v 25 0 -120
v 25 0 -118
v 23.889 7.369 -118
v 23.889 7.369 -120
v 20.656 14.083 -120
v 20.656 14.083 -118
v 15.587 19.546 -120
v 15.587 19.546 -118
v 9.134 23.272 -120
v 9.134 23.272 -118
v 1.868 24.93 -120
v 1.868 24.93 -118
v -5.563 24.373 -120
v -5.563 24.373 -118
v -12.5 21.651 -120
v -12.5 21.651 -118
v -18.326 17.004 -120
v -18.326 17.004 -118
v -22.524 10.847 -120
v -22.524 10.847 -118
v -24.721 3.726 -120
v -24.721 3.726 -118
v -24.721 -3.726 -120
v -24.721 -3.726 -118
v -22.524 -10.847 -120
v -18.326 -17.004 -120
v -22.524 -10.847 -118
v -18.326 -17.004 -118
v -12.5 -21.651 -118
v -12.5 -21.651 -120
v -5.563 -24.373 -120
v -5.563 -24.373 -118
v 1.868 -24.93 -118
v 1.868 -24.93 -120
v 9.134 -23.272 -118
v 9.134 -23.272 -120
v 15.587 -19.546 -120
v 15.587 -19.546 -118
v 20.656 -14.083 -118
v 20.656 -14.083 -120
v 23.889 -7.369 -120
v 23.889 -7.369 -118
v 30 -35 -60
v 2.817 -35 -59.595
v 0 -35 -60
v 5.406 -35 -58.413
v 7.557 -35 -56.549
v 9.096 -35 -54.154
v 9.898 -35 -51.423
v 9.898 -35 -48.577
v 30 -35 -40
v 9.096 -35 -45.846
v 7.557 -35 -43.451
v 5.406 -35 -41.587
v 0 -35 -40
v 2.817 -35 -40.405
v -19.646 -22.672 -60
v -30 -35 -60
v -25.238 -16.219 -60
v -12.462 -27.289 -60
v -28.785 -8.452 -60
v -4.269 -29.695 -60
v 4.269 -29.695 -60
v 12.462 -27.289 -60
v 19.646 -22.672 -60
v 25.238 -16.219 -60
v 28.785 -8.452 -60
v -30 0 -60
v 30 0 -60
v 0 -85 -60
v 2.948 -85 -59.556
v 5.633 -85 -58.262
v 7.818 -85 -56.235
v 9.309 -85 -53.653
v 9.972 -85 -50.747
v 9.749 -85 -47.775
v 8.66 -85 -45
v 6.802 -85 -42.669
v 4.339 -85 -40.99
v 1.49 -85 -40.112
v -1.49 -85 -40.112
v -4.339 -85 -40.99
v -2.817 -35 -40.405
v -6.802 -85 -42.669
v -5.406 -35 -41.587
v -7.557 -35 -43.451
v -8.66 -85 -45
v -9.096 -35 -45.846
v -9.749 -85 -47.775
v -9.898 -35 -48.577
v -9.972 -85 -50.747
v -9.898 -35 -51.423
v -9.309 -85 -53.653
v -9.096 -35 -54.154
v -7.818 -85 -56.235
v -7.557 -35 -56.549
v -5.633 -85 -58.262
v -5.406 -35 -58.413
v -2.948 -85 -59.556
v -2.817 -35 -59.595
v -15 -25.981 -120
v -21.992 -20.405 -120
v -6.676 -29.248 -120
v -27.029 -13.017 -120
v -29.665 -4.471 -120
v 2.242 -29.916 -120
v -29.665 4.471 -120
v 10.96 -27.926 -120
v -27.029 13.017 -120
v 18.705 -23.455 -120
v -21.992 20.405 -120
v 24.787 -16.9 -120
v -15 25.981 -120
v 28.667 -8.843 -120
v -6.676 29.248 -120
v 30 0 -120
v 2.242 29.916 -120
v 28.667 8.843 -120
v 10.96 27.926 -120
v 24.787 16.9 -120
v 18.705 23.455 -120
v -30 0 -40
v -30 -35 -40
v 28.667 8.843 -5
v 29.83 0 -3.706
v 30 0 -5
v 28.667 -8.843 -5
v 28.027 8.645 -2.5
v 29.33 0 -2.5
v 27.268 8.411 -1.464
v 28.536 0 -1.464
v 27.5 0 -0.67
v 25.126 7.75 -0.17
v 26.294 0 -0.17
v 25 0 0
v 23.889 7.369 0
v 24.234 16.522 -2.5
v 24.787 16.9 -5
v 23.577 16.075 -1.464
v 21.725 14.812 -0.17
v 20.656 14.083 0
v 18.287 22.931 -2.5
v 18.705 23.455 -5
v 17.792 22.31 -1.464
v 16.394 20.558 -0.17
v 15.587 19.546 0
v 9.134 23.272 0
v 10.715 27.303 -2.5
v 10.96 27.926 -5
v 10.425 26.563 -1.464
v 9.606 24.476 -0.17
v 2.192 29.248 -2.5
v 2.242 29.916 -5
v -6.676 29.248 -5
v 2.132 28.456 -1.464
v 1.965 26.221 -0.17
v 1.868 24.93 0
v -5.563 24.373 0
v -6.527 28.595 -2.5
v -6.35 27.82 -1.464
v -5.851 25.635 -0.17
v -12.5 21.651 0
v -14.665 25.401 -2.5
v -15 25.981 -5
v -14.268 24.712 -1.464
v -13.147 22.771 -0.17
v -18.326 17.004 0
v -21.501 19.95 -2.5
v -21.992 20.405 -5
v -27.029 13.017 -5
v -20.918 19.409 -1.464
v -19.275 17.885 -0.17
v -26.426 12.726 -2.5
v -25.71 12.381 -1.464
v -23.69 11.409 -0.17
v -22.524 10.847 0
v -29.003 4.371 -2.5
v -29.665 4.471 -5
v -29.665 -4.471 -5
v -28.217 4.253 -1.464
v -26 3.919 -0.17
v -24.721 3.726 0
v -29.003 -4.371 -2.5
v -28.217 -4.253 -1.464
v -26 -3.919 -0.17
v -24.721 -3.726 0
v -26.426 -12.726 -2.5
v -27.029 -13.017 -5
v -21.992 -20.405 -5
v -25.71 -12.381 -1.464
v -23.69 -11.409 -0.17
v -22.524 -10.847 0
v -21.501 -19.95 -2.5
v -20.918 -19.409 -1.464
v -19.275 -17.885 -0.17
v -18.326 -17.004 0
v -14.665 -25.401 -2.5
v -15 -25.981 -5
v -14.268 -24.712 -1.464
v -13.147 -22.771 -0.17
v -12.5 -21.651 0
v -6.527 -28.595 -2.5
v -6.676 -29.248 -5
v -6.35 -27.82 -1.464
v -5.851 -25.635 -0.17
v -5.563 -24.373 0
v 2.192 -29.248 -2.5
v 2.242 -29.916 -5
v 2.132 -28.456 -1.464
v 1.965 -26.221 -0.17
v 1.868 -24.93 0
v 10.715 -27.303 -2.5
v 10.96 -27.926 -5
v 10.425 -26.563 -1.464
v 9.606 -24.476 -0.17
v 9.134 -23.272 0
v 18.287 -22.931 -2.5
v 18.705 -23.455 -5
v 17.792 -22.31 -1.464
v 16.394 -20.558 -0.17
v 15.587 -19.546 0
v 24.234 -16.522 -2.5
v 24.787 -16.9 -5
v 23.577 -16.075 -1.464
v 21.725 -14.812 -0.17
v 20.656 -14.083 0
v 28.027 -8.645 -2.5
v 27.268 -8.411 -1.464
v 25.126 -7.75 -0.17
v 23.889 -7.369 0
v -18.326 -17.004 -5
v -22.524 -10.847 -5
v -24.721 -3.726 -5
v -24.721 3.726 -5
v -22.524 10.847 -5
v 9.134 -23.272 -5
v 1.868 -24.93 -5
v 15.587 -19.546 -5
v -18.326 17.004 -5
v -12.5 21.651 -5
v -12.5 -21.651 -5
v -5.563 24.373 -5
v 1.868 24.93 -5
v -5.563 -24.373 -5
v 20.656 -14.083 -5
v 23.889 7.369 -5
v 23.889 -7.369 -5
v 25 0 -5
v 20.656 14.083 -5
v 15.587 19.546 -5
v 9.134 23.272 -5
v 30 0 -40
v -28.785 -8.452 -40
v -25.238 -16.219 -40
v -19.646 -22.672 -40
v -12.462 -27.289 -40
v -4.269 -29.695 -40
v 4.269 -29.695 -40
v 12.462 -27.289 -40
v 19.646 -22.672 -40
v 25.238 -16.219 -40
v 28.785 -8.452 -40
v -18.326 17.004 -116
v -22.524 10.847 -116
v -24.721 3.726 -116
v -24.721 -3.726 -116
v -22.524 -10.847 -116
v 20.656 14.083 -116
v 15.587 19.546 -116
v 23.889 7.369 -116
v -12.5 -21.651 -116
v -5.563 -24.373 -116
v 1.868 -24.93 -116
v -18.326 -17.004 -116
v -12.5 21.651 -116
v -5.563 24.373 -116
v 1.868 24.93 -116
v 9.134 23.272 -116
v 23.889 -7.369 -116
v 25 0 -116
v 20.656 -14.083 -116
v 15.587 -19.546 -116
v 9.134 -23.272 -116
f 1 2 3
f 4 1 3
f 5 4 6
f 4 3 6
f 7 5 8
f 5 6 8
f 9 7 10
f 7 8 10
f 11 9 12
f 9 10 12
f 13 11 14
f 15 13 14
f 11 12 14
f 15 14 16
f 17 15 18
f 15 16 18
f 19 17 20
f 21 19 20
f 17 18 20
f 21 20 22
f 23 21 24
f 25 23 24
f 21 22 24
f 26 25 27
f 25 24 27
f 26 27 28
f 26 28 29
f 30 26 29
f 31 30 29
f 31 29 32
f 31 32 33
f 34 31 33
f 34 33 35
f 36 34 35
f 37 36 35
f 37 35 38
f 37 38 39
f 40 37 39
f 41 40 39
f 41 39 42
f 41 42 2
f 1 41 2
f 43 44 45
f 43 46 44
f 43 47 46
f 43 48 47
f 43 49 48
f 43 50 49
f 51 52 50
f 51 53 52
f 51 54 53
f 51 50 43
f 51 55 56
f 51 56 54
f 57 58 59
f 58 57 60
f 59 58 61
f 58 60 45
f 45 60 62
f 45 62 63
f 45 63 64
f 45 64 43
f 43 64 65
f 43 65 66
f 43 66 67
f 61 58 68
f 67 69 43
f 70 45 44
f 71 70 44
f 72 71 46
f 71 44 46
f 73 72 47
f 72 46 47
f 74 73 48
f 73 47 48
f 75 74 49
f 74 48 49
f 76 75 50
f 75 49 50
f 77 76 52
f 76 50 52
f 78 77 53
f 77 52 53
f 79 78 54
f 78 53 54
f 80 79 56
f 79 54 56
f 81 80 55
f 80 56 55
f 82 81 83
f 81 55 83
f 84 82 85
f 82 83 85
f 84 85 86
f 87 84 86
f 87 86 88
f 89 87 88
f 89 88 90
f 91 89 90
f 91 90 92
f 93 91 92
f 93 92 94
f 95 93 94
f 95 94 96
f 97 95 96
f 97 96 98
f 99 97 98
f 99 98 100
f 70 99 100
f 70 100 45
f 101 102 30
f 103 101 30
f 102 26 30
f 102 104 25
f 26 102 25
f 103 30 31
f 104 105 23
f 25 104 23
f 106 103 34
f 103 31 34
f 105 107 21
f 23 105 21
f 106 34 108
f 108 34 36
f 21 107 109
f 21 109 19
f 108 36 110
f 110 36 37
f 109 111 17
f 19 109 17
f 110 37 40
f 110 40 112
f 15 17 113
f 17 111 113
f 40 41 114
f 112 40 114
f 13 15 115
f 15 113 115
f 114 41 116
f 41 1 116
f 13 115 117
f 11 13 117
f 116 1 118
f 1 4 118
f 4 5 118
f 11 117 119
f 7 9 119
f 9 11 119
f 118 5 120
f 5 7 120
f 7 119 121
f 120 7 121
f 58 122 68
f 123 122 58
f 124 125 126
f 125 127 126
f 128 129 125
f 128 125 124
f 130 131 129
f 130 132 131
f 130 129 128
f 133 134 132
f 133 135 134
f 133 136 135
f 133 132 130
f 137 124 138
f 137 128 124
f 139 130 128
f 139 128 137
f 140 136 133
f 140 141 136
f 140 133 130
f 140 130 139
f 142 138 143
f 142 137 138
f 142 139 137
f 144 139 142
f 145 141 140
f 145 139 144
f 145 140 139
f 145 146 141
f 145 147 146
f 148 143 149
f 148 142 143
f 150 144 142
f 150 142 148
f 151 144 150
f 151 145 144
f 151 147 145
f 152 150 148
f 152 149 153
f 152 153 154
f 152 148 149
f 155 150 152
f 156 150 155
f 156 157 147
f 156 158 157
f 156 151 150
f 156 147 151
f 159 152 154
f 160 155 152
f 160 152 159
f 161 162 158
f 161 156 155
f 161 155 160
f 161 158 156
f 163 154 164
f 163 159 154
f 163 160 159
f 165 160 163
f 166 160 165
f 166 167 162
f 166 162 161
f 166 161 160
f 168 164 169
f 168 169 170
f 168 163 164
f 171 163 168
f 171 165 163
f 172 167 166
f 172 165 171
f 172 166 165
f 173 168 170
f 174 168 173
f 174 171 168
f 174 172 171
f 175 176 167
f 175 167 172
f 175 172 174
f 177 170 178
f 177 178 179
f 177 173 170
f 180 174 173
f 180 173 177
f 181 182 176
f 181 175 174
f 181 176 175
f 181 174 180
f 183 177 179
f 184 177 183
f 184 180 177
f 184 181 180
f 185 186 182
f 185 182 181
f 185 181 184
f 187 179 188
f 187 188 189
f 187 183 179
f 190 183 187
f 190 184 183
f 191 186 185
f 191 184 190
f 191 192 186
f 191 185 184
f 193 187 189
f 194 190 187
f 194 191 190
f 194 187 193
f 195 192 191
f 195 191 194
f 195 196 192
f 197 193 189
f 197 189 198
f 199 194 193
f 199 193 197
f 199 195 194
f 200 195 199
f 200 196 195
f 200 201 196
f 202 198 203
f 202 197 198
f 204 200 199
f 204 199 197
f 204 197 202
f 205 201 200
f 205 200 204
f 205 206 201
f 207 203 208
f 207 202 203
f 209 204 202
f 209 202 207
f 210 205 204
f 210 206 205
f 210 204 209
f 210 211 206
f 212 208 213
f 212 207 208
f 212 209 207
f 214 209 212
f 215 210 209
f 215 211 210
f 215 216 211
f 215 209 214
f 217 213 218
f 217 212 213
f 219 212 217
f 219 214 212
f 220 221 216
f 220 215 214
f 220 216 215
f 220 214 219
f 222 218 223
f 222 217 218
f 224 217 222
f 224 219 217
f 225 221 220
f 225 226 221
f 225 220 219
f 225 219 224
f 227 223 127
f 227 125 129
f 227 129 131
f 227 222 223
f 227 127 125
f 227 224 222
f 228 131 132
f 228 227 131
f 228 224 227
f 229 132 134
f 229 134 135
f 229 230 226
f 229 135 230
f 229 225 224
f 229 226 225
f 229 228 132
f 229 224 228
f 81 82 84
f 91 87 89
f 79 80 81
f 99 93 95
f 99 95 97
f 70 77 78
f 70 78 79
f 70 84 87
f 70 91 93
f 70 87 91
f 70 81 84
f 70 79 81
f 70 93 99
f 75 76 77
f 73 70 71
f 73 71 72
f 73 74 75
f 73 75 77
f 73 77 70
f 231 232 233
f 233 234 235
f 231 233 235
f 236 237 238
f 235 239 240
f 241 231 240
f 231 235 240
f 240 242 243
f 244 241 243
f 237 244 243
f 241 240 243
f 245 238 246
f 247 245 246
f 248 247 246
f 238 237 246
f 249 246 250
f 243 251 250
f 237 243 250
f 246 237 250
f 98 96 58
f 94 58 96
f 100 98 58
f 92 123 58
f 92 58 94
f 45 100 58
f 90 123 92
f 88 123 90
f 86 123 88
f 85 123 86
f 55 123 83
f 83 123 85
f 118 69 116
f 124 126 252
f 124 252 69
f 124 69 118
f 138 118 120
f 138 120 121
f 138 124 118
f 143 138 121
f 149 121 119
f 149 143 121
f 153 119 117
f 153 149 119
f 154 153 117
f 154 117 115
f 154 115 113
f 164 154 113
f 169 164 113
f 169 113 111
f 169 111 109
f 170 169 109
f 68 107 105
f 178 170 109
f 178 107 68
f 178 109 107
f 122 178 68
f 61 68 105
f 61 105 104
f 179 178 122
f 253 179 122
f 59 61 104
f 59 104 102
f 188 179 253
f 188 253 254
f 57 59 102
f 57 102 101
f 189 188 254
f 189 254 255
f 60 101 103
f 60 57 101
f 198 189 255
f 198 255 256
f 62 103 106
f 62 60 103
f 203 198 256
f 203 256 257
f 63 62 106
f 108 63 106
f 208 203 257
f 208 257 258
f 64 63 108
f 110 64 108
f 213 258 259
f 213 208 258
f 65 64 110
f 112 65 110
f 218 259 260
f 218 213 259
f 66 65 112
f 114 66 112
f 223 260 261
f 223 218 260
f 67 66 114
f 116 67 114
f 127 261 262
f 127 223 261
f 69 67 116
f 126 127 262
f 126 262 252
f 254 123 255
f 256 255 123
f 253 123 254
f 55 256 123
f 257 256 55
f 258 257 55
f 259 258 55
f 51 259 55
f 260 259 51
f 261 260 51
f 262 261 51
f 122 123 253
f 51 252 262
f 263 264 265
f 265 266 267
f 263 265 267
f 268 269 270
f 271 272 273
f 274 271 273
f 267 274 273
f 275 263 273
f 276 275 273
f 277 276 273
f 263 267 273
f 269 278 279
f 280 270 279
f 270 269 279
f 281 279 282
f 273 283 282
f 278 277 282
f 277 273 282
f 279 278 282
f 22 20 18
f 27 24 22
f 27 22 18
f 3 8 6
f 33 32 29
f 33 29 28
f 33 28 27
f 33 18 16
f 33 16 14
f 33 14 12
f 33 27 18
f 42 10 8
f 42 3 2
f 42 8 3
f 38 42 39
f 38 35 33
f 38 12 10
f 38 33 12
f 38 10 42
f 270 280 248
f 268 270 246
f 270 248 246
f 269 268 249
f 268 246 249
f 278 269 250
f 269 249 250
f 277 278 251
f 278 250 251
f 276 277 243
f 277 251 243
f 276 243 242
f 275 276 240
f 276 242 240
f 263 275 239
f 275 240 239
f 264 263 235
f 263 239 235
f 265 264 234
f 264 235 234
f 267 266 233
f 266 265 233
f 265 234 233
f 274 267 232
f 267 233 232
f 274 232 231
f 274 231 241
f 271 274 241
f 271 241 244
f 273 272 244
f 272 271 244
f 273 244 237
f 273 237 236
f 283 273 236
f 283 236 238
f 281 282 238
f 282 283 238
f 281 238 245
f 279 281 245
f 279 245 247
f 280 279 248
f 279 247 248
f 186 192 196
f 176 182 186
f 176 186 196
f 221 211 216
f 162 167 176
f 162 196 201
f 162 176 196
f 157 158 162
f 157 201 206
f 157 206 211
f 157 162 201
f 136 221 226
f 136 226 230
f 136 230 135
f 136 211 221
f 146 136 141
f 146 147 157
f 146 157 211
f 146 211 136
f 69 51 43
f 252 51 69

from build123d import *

# Parameters (mm, degrees)
TUBE_SKETCH_R             = 30
TUBE_EXTRUDE_DEPTH        = 120
TUBE_SHELL_T              = -5
SUPPRT_START              = 20
SUPPRT_BAND_EXTRUDE_DEPTH = 20
PIN_SKETCH_R              = 10
PIN_EXTRUDE_DEPTH         = 50
APERTURE_START            = -4
APERTURE_SKETCH_R         = 25
APERTURE_EXTRUDE_DEPTH    = 2
REAR_FILLET_R             = 5


with BuildPart() as part:
    # Tube Sketch → Tube Extrude (new body)
    with BuildSketch(Plane.XY):
        Circle(TUBE_SKETCH_R)
    extrude(amount=-TUBE_EXTRUDE_DEPTH)

    # Tube Shell
    tube_shell_openings = [part.faces().sort_by_distance(p)[0] for p in [
        (0, 0, -120),
    ]]
    offset(amount=TUBE_SHELL_T, openings=tube_shell_openings, kind=Kind.INTERSECTION)

    # Support Band Sketch → Supprt Band Extrude (add)
    with BuildSketch(Plane.XY.offset(-60).offset(SUPPRT_START)):
        with BuildLine():
            Line((-30, 0), (-30, -35))
            Line((-30, -35), (30, -35))
            Line((30, -35), (30, 0))
            ThreePointArc((30, 0), (0, -30), (-30, 0))
        make_face()
    extrude(amount=-SUPPRT_BAND_EXTRUDE_DEPTH)

    # Pin Sketch → Pin Extrude (add)
    with BuildSketch(Plane.XZ.offset(35)):
        with Locations(Location((0, -50, 0), (0, 0, 270))):
            Circle(PIN_SKETCH_R)
    extrude(amount=PIN_EXTRUDE_DEPTH)

    # Aperture Sketch → Aperture Extrude (add)
    with BuildSketch(Plane(origin=(0, 0, -120), x_dir=(-1, 0, 0), z_dir=(0, 0, -1)).offset(APERTURE_START)):
        with Locations(Location((0, 0, 0), (0, 0, 180))):
            Circle(APERTURE_SKETCH_R)
    extrude(amount=APERTURE_EXTRUDE_DEPTH)

    # Rear Fillet
    rear_fillet_edges = [part.edges().sort_by_distance(p)[0] for p in [
        (-30, 0, 0),
    ]]
    fillet(rear_fillet_edges, radius=REAR_FILLET_R)


solid = part.part
